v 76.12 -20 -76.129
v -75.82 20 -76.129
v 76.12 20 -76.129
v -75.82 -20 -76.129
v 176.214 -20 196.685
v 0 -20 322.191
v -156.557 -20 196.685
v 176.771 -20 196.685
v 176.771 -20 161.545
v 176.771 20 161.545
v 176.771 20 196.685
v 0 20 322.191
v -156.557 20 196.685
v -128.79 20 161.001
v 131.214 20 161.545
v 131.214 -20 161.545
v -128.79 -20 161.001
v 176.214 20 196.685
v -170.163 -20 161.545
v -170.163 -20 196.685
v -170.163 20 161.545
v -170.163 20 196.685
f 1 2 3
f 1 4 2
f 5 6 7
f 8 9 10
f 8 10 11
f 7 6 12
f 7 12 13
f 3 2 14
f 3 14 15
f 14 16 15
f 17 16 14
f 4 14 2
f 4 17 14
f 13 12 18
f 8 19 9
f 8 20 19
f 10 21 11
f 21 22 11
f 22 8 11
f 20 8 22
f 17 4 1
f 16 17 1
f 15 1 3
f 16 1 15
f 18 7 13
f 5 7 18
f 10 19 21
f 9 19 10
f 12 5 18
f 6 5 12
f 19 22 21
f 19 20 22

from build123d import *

# Parameters (mm, degrees)
F2_DEPTH = 20


with BuildPart() as f2:
    # F1 (on face) → F2 (new body, symmetric)
    with BuildSketch(Plane.XZ):
        Polygon((176.2142172069, 196.6851651669), (0, 322.1913451918), (-156.5569793337, 196.6851651669), align=None)
    extrude(amount=F2_DEPTH, both=True)


with BuildPart() as f2b:
    # F0 (on Front) → F2, piece 2 (new body, symmetric)
    with BuildSketch(Plane.XZ):
        Polygon((-170.1626926661, 161.5447551012), (131.2139630318, 161.5447551012), (176.7711341381, 161.5447551012), (176.7711341381, 196.6851651669), (-170.1626926661, 196.6851651669), align=None)
    extrude(amount=F2_DEPTH, both=True)


with BuildPart() as f2c:
    # F0 (on Front) → F2, piece 3 (new body, symmetric)
    with BuildSketch(Plane.XZ):
        Polygon((-75.8202075958, -76.1290788651), (76.1203169823, -76.1290788651), (131.2139630318, 161.5447551012), (-128.7904828787, 161.0014289618), align=None)
    extrude(amount=F2_DEPTH, both=True)


solid = Compound([f2.part, f2b.part, f2c.part])
